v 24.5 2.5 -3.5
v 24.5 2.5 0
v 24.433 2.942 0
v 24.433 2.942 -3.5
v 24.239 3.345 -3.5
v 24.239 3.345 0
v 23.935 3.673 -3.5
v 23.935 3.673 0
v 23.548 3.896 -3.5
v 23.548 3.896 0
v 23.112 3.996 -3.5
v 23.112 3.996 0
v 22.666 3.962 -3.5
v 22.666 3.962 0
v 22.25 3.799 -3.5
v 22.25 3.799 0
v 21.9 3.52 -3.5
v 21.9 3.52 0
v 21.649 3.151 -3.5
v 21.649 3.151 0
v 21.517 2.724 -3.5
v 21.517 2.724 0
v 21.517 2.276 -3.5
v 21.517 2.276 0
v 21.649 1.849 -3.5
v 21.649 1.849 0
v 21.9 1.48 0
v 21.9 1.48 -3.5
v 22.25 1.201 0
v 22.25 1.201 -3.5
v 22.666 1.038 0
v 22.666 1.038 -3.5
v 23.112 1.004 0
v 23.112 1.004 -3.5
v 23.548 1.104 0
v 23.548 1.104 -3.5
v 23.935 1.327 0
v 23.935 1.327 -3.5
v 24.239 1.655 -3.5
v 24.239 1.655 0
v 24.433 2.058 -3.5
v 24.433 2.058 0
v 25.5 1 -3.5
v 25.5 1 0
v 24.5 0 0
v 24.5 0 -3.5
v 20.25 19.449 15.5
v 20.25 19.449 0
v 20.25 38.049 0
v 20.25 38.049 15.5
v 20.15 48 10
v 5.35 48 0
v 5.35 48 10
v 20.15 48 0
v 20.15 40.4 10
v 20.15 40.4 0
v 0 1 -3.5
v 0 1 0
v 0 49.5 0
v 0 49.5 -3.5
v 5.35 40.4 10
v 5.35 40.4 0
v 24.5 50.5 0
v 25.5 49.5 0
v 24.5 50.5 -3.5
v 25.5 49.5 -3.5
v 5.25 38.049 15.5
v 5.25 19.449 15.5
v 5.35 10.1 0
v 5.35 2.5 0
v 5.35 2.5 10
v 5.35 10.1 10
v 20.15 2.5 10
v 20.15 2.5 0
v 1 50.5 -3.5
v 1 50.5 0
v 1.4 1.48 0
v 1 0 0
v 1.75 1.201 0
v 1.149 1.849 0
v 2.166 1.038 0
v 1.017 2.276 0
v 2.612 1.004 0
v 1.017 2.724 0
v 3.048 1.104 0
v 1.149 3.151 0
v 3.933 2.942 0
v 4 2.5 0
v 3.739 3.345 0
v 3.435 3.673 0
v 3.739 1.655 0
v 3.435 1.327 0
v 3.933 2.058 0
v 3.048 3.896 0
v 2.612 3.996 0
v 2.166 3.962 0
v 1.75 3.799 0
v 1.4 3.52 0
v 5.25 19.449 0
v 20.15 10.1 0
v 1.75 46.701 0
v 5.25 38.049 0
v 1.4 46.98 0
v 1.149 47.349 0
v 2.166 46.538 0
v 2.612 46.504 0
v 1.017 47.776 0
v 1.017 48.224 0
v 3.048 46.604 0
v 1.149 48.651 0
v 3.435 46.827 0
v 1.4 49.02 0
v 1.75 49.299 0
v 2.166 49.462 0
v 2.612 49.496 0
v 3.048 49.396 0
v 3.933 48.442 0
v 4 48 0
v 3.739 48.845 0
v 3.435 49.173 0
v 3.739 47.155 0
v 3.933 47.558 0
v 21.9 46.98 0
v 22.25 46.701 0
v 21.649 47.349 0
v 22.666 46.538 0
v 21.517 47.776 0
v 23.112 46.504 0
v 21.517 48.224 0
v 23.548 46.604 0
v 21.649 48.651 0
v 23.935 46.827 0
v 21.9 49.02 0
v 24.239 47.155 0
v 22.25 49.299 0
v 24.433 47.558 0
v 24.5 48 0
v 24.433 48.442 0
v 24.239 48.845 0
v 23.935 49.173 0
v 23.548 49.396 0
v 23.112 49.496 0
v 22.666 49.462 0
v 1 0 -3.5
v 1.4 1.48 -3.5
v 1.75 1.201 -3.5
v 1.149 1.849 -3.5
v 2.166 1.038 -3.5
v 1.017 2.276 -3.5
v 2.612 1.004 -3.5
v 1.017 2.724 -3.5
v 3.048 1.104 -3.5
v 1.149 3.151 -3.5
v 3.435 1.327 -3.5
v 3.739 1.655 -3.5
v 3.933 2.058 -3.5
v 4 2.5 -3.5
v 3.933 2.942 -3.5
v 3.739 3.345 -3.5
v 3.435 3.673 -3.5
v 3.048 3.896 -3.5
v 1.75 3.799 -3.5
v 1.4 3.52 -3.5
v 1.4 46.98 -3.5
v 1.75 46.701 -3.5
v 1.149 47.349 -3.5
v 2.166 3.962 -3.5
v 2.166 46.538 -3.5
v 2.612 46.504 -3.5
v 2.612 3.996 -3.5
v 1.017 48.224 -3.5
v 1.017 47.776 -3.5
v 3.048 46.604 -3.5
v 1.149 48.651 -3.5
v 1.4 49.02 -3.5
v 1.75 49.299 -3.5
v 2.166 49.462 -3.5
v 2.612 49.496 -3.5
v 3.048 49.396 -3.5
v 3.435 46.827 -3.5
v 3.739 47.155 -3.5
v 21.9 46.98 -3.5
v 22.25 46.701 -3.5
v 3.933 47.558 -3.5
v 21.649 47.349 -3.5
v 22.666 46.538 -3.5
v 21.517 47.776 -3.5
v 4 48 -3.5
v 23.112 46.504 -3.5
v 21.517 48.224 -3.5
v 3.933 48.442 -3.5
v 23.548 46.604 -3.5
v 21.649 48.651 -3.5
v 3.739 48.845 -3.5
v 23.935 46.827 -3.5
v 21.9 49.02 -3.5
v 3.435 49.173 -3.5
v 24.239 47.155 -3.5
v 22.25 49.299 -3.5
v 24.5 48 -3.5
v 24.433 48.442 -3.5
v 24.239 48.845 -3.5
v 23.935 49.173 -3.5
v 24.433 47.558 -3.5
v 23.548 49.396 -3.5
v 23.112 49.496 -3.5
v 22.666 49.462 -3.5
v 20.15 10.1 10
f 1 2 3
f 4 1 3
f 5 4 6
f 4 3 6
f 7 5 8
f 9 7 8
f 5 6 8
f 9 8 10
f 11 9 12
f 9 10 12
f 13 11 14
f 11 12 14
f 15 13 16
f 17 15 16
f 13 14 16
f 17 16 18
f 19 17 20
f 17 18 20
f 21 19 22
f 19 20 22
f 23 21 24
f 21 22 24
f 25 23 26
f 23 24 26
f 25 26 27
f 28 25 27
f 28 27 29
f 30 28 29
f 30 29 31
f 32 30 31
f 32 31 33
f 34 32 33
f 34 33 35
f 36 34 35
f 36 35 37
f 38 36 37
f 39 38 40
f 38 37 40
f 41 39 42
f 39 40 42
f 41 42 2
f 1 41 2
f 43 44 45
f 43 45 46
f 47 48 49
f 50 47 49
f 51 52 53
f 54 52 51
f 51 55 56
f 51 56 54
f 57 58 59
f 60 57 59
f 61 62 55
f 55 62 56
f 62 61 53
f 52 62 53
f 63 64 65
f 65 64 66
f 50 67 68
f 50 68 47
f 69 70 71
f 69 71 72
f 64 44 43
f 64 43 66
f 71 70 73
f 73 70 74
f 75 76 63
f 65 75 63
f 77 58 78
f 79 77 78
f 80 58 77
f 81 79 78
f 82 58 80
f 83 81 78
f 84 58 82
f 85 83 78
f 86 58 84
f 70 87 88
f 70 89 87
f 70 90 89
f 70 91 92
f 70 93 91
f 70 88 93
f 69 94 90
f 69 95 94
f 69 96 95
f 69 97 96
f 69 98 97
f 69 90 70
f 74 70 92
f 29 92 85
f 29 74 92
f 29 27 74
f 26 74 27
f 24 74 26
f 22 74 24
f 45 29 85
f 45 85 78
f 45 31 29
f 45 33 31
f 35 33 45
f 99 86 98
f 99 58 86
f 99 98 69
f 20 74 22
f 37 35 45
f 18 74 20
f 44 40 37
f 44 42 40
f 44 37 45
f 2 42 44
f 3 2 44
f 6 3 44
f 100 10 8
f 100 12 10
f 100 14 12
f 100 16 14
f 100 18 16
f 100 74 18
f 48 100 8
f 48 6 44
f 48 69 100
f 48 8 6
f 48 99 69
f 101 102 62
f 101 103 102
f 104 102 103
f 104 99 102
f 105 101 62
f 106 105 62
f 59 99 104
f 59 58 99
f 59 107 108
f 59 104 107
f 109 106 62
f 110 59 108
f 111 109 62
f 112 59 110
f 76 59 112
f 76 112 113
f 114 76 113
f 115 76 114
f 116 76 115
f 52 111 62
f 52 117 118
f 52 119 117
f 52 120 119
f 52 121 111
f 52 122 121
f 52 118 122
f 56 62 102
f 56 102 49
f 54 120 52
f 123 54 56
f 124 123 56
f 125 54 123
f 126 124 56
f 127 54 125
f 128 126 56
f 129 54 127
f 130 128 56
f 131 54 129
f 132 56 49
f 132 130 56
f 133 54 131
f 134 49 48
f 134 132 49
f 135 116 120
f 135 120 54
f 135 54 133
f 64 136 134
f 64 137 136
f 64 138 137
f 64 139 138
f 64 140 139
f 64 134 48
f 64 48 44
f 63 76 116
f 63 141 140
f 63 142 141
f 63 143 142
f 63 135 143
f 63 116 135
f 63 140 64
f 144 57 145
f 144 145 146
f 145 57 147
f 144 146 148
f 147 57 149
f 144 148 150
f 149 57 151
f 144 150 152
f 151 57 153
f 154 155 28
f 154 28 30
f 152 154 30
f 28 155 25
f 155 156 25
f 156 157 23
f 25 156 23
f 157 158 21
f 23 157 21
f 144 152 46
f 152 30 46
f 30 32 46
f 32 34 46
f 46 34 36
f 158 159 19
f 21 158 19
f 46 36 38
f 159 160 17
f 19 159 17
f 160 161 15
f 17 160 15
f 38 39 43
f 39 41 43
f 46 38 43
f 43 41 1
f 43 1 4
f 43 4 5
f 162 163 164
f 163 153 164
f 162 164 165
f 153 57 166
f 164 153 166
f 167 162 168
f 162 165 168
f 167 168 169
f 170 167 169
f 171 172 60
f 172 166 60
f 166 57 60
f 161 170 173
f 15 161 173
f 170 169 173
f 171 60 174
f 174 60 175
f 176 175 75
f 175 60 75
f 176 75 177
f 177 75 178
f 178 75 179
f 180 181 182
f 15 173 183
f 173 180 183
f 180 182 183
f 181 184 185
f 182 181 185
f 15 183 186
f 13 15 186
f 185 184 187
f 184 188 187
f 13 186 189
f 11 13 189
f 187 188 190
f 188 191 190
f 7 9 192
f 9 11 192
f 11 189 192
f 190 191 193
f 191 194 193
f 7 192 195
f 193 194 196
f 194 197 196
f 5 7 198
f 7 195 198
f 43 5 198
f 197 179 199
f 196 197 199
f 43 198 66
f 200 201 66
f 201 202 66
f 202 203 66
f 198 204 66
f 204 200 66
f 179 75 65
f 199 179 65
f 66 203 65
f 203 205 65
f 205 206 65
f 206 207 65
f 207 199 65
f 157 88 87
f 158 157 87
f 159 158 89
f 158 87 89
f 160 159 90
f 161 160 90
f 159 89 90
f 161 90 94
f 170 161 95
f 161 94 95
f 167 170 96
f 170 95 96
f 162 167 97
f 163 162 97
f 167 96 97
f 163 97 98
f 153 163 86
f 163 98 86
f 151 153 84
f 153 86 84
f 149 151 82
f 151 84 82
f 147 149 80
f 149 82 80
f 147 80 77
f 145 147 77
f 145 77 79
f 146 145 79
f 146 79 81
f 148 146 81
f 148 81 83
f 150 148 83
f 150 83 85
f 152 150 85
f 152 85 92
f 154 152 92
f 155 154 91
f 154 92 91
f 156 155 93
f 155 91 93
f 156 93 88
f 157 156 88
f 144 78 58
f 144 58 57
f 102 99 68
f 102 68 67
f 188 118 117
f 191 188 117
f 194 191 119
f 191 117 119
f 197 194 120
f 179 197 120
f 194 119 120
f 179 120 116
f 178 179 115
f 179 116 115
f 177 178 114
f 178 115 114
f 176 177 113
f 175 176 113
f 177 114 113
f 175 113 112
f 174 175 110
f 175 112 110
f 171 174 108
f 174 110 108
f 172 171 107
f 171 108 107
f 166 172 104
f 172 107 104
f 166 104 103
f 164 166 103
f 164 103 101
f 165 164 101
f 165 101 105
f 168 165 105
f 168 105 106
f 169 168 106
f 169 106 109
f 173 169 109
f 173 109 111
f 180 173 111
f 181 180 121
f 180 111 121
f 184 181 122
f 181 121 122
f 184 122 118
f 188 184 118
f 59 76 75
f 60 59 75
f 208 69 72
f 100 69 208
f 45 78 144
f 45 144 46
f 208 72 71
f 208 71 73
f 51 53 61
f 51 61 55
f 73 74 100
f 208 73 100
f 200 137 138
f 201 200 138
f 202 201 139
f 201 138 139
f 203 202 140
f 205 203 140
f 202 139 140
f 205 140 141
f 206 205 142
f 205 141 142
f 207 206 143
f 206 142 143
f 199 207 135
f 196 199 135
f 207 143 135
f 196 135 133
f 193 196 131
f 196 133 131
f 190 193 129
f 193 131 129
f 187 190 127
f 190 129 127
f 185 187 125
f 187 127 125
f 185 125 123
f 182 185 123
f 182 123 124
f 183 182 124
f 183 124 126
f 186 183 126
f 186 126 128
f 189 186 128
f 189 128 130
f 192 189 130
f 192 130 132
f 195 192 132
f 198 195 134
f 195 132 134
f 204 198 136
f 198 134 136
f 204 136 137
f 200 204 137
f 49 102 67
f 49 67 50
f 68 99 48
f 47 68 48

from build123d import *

# Parameters (mm, degrees)
SKETCH1_W           = 25.5
SKETCH1_H           = 50.5
SKETCH1_R           = 1.5
BOSS_EXTRUDE1_DEPTH = 3.5
SKETCH1_4_W         = 14.8
SKETCH1_4_H         = 7.6
BOSS_EXTRUDE2_DEPTH = 10
SKETCH1_6_W         = 15
SKETCH1_6_H         = 18.6
BOSS_EXTRUDE3_DEPTH = 15.5
CHAMFER1_SIZE       = 1


with BuildPart() as part:
    # Sketch1 → Boss-Extrude1 (new body)
    with BuildSketch(Plane.XY):
        with Locations((12.75, 25.25)):
            Rectangle(SKETCH1_W, SKETCH1_H)
        with Locations((2.5, 2.5)):
            Circle(SKETCH1_R, mode=Mode.SUBTRACT)
        with Locations((23, 2.5)):
            Circle(SKETCH1_R, mode=Mode.SUBTRACT)
        with Locations((2.5, 48)):
            Circle(SKETCH1_R, mode=Mode.SUBTRACT)
        with Locations((23, 48)):
            Circle(SKETCH1_R, mode=Mode.SUBTRACT)
    extrude(amount=-BOSS_EXTRUDE1_DEPTH)

    # Sketch1<4> → Boss-Extrude2 (add)
    with BuildSketch(Plane.XY):
        with Locations((12.75, 44.2)):
            Rectangle(SKETCH1_4_W, SKETCH1_4_H)
        with Locations((12.75, 6.3)):
            Rectangle(SKETCH1_4_W, SKETCH1_4_H)
    extrude(amount=BOSS_EXTRUDE2_DEPTH)

    # Sketch1<6> → Boss-Extrude3 (add)
    with BuildSketch(Plane.XY):
        with Locations((12.75, 28.74855078)):
            Rectangle(SKETCH1_6_W, SKETCH1_6_H)
    extrude(amount=BOSS_EXTRUDE3_DEPTH)

    # Chamfer1
    chamfer1_edges = [part.edges().sort_by_distance(p)[0] for p in [
        (25.5, 0, -1.75),
        (0, 0, -1.75),
        (25.5, 50.5, -1.75),
        (0, 50.5, -1.75),
    ]]
    chamfer(chamfer1_edges, length=CHAMFER1_SIZE)


solid = part.part
